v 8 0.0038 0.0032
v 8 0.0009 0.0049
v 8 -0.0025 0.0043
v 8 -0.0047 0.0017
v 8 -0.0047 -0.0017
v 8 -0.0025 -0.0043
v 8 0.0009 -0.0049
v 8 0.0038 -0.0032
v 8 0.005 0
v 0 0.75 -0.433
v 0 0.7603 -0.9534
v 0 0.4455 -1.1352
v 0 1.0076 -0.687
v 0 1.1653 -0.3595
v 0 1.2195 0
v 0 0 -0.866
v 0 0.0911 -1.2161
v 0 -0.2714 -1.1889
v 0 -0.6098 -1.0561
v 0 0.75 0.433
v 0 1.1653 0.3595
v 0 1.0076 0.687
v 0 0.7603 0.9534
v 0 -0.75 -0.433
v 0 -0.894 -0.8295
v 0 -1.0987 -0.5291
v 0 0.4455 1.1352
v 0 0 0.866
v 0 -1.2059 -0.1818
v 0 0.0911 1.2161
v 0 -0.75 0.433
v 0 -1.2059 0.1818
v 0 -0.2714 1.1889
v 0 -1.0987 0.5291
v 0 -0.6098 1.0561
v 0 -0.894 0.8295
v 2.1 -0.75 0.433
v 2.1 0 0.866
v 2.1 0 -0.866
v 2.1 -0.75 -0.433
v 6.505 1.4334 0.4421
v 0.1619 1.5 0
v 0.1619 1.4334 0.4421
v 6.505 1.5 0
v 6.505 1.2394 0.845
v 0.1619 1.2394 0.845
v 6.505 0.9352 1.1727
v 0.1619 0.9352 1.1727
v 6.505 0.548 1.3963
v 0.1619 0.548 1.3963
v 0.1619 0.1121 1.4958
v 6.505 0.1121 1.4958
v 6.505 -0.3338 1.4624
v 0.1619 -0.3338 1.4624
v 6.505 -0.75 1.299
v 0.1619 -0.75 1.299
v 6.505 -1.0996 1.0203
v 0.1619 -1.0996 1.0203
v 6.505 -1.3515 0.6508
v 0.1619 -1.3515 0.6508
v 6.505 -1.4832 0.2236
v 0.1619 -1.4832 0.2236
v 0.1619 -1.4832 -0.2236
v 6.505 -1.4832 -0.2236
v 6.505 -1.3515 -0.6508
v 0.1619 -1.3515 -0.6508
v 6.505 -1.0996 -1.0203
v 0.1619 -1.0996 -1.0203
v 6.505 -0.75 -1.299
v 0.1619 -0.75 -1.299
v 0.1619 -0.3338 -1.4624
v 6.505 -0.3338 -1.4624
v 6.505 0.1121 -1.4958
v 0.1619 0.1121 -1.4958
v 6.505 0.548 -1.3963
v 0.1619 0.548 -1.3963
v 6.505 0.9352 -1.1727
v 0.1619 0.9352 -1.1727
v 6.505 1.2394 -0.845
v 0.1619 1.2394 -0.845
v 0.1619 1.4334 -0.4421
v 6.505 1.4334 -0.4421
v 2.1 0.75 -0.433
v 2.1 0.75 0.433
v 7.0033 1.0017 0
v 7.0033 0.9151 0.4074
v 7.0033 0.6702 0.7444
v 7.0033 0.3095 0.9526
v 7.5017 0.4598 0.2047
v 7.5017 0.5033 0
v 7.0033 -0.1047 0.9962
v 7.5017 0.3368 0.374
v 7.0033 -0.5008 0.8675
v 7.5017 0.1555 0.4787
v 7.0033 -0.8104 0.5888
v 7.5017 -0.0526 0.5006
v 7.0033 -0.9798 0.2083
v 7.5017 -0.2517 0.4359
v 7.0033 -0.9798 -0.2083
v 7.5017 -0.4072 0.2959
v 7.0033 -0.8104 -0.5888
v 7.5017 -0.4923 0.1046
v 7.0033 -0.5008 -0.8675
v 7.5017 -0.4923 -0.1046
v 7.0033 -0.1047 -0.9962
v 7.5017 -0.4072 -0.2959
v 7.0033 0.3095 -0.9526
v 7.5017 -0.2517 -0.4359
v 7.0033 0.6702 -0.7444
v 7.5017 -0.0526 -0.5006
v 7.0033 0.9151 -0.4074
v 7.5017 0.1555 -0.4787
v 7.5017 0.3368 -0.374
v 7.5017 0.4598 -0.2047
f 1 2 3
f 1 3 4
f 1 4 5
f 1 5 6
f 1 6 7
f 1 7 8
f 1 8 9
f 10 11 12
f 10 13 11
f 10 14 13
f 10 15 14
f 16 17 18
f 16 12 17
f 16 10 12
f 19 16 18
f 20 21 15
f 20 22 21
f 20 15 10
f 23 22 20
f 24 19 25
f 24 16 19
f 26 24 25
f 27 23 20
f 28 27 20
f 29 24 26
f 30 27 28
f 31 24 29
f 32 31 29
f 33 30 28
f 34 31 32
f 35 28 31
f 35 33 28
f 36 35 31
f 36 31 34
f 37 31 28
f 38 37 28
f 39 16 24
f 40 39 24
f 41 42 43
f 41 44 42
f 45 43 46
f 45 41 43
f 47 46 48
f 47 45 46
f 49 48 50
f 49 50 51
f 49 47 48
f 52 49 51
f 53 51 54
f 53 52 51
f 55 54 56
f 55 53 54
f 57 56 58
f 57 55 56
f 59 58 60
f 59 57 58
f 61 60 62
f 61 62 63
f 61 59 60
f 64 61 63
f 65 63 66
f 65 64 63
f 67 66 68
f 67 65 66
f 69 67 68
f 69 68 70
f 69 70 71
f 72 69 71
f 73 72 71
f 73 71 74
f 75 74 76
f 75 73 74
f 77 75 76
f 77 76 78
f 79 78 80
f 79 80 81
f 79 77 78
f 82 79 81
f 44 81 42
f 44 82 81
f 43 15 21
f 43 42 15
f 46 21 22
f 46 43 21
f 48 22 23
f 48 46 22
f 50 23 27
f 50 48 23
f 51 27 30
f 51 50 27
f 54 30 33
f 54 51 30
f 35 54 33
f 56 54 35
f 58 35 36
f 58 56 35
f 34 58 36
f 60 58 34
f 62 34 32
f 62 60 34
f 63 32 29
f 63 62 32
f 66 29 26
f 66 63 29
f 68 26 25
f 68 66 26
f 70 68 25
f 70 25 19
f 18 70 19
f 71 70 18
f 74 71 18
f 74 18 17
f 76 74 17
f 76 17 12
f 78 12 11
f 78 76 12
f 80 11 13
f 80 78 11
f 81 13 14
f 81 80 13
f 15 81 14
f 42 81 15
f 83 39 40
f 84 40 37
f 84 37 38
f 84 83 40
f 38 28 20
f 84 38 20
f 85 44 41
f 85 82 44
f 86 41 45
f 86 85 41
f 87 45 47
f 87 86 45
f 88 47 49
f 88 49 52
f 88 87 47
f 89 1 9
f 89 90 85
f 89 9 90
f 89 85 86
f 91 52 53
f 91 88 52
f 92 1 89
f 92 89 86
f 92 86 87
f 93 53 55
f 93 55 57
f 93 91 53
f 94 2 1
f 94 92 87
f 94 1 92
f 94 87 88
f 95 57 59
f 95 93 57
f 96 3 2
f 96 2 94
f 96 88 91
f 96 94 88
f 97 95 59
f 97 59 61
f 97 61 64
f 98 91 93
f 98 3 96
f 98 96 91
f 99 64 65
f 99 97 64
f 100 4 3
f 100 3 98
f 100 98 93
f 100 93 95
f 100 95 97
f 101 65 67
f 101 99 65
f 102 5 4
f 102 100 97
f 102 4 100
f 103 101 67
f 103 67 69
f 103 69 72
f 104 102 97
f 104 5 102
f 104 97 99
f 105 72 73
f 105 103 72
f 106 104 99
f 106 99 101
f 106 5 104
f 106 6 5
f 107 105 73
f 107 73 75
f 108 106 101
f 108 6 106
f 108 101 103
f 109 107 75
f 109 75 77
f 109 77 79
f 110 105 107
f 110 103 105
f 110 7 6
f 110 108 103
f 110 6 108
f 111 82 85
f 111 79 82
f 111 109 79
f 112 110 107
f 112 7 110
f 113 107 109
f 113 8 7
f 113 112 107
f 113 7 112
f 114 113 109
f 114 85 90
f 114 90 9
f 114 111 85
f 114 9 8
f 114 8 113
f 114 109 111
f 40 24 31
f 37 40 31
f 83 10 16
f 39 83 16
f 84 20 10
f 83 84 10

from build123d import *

# Parameters (mm, degrees)
HEX_2_DEPTH = 2.1


with BuildPart() as part:
    # BodySke → BaseBody (revolve)
    with BuildSketch(Plane.XY):
        Polygon((0, 0), (0, 1.2195), (0.161946751, 1.5), (6.505, 1.5), (8, 0.005), (8, 0), align=None)
    revolve(axis=Axis((-12.7, 0, 0), (1, 0, 0)))

    # Sketch2 → Hex 2 (cut)
    with BuildSketch(Plane.ZY):
        Polygon((0.433012702, 0.75), (-0.433012702, 0.75), (-0.866025404, 0), (-0.433012702, -0.75), (0.433012702, -0.75), (0.866025404, 0), align=None)
    extrude(amount=-HEX_2_DEPTH, mode=Mode.SUBTRACT)


solid = part.part
